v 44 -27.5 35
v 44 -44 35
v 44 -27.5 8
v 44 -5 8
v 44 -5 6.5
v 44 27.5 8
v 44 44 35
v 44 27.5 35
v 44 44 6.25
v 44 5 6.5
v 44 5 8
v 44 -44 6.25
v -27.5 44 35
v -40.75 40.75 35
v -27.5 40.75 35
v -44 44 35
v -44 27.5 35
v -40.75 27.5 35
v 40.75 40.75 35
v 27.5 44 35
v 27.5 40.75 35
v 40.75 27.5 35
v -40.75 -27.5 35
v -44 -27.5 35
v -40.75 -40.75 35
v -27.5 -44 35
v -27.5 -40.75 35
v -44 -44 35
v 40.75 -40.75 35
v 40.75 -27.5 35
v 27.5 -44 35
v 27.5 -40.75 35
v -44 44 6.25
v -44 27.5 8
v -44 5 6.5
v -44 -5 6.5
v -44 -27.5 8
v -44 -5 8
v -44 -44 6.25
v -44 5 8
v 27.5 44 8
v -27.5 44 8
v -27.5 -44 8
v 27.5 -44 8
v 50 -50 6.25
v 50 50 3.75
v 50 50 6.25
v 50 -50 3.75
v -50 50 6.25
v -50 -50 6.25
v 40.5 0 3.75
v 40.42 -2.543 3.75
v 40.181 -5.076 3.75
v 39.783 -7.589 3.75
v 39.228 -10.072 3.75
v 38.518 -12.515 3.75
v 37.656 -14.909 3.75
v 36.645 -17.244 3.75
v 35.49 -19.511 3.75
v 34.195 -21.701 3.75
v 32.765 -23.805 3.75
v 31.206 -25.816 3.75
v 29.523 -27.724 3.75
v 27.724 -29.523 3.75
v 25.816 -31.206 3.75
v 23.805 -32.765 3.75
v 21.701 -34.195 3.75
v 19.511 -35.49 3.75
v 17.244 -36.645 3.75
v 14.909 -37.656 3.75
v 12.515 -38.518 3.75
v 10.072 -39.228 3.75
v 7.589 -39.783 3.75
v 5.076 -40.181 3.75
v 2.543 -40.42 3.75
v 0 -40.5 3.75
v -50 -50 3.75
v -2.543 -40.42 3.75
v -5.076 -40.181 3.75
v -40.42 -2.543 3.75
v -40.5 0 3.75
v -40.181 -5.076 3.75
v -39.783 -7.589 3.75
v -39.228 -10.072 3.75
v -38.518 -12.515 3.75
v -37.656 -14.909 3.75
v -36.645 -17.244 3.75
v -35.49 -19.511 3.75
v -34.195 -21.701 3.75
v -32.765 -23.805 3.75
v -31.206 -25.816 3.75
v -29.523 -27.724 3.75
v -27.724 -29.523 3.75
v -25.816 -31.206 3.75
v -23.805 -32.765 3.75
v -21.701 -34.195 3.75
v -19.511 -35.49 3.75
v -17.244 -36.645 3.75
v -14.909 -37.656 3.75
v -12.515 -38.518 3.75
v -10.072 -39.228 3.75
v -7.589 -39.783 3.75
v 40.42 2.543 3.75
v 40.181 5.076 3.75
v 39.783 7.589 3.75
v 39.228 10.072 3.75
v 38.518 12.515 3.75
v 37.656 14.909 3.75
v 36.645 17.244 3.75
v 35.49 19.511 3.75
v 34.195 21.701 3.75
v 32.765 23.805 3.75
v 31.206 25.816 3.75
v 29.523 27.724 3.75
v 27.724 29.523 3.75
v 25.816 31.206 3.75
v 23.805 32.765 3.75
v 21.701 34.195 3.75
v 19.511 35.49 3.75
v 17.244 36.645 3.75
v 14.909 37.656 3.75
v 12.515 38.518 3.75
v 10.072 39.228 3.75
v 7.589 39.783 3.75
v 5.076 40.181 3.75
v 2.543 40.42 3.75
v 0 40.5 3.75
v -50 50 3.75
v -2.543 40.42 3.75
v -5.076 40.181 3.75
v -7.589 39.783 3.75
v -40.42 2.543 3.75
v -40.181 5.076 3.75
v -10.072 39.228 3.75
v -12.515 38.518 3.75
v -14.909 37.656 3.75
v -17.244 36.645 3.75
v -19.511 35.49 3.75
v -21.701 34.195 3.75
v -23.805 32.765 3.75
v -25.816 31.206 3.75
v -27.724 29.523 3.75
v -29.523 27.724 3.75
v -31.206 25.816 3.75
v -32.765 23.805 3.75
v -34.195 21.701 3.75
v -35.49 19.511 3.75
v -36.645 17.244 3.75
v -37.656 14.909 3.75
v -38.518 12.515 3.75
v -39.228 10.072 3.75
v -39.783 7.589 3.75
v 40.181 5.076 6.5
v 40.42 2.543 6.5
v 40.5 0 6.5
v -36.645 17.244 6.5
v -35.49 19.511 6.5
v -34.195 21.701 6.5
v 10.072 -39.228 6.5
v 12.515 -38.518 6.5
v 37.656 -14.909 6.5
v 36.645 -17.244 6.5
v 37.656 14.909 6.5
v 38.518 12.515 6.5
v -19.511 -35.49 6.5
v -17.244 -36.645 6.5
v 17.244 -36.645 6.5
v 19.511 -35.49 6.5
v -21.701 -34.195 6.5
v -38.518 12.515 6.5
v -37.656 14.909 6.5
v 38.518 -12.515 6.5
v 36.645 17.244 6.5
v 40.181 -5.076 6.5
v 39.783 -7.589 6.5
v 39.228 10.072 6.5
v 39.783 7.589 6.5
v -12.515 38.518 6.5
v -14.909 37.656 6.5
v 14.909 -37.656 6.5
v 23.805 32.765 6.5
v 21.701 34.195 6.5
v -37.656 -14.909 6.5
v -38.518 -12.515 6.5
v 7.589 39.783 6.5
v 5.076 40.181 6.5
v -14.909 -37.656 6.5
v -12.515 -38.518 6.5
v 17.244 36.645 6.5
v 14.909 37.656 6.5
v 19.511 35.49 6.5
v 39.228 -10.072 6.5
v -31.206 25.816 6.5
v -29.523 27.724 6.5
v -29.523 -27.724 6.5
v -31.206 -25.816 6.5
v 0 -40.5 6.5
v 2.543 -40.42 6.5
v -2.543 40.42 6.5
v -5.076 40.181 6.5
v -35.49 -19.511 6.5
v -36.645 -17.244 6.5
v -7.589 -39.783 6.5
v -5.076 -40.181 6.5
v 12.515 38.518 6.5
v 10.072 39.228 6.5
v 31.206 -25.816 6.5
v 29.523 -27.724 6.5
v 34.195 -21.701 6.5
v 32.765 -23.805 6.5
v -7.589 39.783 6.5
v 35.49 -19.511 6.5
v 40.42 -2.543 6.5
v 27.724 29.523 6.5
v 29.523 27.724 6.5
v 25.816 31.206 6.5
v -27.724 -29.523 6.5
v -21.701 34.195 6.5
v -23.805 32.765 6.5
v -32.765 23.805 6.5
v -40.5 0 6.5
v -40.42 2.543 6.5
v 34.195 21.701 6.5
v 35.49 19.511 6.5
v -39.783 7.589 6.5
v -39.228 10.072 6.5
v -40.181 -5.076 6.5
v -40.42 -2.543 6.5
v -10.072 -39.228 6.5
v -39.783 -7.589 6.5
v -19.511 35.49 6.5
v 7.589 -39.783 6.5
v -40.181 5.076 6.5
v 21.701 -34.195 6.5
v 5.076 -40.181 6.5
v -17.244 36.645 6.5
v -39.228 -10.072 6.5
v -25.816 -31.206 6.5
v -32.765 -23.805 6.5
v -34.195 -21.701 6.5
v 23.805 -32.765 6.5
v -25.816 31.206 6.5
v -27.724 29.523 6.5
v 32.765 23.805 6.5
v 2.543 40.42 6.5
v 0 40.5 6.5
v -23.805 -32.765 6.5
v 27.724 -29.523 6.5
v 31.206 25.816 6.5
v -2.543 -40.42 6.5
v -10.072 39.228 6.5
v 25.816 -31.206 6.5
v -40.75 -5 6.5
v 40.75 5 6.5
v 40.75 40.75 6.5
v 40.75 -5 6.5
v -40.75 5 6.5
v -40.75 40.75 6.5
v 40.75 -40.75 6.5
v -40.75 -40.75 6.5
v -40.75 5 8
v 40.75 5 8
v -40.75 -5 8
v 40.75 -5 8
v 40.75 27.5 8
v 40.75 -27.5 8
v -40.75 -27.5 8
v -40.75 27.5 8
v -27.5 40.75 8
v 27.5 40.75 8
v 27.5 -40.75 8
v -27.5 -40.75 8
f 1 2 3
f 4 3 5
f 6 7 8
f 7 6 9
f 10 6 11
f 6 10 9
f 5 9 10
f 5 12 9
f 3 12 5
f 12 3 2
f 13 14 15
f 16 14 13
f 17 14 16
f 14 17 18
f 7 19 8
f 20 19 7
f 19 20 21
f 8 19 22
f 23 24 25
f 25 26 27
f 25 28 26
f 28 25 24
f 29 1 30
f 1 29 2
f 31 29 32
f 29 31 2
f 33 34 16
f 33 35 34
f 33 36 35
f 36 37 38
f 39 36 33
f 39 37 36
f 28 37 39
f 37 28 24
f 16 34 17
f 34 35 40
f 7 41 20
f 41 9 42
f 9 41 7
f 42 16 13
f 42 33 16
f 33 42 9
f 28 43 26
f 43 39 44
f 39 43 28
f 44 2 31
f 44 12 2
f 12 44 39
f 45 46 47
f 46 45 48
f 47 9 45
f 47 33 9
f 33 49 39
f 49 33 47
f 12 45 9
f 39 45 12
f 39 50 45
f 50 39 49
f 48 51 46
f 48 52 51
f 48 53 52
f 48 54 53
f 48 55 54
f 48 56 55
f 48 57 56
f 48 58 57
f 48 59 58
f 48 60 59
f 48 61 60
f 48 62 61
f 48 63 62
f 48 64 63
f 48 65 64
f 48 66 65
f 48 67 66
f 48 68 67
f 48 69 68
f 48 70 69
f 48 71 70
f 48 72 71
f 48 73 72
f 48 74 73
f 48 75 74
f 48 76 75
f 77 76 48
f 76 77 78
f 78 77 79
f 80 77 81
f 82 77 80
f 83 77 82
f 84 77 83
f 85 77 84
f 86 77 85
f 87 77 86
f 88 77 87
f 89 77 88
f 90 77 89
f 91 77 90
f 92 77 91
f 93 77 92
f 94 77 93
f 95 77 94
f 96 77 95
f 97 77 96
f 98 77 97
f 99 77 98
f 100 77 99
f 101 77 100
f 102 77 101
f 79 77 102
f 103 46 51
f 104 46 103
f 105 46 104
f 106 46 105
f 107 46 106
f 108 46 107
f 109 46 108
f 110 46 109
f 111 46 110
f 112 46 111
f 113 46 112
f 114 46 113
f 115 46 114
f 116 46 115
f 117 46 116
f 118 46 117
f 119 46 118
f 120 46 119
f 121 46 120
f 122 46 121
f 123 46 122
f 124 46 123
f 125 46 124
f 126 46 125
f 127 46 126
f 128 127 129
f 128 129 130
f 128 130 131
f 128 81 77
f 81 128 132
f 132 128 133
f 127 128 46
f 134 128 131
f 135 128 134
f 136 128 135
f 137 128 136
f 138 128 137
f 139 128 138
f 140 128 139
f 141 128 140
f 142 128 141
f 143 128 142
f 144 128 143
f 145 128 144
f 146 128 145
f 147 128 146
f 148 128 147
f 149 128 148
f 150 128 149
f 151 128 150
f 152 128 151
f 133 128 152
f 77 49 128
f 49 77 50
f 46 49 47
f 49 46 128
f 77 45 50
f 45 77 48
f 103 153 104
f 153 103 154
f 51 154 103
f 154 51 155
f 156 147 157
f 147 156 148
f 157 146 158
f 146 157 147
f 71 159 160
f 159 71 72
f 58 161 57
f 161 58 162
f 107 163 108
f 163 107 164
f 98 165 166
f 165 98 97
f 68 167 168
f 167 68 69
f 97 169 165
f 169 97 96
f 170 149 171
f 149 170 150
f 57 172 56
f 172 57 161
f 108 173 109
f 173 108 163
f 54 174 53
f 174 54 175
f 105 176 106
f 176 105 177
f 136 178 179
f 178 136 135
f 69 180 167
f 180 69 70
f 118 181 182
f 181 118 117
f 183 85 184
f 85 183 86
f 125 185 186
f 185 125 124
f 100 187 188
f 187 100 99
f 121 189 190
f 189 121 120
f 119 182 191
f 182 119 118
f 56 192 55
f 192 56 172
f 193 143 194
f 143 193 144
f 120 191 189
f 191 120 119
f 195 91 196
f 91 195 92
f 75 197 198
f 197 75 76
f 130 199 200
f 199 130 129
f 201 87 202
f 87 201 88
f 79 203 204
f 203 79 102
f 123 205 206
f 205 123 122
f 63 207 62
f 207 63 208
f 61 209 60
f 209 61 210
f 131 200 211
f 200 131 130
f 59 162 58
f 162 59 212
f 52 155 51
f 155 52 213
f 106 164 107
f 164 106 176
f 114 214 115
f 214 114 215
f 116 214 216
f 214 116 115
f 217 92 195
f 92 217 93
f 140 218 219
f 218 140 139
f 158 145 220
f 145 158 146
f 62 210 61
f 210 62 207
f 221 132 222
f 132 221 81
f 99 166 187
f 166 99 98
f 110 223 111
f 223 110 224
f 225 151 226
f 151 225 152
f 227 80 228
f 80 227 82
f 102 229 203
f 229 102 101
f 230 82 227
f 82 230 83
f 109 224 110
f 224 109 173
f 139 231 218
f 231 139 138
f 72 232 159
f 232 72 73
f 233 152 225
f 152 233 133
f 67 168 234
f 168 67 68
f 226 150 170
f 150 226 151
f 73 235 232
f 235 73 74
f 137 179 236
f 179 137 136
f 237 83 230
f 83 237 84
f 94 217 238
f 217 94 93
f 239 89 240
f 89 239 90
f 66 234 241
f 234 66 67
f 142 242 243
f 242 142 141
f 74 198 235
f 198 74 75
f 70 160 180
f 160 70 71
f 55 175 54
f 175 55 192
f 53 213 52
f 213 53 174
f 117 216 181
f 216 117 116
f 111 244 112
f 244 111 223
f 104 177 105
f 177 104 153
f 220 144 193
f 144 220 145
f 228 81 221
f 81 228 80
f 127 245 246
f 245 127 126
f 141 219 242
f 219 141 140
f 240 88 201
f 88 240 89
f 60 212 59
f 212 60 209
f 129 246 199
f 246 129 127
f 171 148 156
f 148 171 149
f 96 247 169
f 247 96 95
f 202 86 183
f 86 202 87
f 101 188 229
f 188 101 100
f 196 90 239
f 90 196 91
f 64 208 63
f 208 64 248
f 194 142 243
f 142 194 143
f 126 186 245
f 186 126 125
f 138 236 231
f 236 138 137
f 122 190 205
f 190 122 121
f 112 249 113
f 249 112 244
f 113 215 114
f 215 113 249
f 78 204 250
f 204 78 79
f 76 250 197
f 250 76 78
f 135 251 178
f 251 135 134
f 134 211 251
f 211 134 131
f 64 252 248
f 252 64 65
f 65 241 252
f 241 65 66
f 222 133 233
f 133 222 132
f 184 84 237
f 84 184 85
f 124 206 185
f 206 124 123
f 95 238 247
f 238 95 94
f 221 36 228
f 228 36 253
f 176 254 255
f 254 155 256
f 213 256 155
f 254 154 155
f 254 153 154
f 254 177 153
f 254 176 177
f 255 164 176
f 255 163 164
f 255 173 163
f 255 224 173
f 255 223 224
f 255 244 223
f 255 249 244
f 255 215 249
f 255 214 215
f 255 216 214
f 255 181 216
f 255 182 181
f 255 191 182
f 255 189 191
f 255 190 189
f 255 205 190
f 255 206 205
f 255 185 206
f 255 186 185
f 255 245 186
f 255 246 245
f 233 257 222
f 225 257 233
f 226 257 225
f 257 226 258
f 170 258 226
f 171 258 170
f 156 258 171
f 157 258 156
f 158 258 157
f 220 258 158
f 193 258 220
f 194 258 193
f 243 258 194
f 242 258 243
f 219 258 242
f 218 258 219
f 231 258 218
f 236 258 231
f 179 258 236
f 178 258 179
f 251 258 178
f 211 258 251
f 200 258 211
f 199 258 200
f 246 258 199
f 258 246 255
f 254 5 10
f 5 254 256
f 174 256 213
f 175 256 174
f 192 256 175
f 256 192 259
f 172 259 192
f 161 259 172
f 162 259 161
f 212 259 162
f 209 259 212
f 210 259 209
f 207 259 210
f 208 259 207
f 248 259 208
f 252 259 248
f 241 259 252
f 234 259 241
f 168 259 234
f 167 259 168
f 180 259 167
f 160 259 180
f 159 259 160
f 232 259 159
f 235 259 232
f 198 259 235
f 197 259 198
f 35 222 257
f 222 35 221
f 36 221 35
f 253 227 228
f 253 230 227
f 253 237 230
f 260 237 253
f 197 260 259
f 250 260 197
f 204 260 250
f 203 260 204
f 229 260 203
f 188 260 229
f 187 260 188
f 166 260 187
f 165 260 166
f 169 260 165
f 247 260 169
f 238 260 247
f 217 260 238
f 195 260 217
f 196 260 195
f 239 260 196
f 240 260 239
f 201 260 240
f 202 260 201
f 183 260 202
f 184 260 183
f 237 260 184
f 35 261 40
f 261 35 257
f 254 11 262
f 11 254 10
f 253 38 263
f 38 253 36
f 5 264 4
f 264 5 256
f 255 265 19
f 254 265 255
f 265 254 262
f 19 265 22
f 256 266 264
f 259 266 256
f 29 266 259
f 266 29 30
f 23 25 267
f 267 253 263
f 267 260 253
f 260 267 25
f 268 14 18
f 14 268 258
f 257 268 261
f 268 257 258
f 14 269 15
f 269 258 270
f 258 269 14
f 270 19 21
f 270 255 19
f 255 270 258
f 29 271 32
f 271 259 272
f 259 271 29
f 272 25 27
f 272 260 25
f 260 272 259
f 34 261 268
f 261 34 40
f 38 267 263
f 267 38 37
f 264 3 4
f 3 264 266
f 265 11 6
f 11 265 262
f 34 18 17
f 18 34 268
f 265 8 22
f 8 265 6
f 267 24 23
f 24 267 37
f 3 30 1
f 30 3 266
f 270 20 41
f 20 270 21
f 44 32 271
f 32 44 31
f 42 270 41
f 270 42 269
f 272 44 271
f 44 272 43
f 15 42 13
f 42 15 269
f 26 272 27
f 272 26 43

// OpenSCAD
// WASABI Niko FDM Printer
// Cooler 80x80 mount
// GNU GPL v3
// SANTA no Mix
// https://ameblo.jp/math-physics/theme-10117154956.html
// https://github.com/SantaNoMix/
$fn = 100;
difference () {
    difference () {
        union () {
            translate ([0,0,20]) {
                cube ([88,88,30],center = true);
            }
            translate ([0,0,5]) {
            cube ([100,100,2.5],center = true);
            }
        }
        translate ([0,0,15]) {
            cylinder (30,40.5,40.5,center = true);
        }
    }
    translate ([0,0,8]) {
        cube ([200,10,3],center = true);
    }
    translate ([0,0,21]) {
        cube ([81.5,81.5,29],center = true);
    }
//    translate ([0,0,30]) {
//        cube ([200,5,3],center = true);
//    }
    translate ([0,0,28]) {
    cube ([120,55,40],center = true);
}
    translate ([0,0,28]) {
    cube ([55,120,40],center = true);
}
}
